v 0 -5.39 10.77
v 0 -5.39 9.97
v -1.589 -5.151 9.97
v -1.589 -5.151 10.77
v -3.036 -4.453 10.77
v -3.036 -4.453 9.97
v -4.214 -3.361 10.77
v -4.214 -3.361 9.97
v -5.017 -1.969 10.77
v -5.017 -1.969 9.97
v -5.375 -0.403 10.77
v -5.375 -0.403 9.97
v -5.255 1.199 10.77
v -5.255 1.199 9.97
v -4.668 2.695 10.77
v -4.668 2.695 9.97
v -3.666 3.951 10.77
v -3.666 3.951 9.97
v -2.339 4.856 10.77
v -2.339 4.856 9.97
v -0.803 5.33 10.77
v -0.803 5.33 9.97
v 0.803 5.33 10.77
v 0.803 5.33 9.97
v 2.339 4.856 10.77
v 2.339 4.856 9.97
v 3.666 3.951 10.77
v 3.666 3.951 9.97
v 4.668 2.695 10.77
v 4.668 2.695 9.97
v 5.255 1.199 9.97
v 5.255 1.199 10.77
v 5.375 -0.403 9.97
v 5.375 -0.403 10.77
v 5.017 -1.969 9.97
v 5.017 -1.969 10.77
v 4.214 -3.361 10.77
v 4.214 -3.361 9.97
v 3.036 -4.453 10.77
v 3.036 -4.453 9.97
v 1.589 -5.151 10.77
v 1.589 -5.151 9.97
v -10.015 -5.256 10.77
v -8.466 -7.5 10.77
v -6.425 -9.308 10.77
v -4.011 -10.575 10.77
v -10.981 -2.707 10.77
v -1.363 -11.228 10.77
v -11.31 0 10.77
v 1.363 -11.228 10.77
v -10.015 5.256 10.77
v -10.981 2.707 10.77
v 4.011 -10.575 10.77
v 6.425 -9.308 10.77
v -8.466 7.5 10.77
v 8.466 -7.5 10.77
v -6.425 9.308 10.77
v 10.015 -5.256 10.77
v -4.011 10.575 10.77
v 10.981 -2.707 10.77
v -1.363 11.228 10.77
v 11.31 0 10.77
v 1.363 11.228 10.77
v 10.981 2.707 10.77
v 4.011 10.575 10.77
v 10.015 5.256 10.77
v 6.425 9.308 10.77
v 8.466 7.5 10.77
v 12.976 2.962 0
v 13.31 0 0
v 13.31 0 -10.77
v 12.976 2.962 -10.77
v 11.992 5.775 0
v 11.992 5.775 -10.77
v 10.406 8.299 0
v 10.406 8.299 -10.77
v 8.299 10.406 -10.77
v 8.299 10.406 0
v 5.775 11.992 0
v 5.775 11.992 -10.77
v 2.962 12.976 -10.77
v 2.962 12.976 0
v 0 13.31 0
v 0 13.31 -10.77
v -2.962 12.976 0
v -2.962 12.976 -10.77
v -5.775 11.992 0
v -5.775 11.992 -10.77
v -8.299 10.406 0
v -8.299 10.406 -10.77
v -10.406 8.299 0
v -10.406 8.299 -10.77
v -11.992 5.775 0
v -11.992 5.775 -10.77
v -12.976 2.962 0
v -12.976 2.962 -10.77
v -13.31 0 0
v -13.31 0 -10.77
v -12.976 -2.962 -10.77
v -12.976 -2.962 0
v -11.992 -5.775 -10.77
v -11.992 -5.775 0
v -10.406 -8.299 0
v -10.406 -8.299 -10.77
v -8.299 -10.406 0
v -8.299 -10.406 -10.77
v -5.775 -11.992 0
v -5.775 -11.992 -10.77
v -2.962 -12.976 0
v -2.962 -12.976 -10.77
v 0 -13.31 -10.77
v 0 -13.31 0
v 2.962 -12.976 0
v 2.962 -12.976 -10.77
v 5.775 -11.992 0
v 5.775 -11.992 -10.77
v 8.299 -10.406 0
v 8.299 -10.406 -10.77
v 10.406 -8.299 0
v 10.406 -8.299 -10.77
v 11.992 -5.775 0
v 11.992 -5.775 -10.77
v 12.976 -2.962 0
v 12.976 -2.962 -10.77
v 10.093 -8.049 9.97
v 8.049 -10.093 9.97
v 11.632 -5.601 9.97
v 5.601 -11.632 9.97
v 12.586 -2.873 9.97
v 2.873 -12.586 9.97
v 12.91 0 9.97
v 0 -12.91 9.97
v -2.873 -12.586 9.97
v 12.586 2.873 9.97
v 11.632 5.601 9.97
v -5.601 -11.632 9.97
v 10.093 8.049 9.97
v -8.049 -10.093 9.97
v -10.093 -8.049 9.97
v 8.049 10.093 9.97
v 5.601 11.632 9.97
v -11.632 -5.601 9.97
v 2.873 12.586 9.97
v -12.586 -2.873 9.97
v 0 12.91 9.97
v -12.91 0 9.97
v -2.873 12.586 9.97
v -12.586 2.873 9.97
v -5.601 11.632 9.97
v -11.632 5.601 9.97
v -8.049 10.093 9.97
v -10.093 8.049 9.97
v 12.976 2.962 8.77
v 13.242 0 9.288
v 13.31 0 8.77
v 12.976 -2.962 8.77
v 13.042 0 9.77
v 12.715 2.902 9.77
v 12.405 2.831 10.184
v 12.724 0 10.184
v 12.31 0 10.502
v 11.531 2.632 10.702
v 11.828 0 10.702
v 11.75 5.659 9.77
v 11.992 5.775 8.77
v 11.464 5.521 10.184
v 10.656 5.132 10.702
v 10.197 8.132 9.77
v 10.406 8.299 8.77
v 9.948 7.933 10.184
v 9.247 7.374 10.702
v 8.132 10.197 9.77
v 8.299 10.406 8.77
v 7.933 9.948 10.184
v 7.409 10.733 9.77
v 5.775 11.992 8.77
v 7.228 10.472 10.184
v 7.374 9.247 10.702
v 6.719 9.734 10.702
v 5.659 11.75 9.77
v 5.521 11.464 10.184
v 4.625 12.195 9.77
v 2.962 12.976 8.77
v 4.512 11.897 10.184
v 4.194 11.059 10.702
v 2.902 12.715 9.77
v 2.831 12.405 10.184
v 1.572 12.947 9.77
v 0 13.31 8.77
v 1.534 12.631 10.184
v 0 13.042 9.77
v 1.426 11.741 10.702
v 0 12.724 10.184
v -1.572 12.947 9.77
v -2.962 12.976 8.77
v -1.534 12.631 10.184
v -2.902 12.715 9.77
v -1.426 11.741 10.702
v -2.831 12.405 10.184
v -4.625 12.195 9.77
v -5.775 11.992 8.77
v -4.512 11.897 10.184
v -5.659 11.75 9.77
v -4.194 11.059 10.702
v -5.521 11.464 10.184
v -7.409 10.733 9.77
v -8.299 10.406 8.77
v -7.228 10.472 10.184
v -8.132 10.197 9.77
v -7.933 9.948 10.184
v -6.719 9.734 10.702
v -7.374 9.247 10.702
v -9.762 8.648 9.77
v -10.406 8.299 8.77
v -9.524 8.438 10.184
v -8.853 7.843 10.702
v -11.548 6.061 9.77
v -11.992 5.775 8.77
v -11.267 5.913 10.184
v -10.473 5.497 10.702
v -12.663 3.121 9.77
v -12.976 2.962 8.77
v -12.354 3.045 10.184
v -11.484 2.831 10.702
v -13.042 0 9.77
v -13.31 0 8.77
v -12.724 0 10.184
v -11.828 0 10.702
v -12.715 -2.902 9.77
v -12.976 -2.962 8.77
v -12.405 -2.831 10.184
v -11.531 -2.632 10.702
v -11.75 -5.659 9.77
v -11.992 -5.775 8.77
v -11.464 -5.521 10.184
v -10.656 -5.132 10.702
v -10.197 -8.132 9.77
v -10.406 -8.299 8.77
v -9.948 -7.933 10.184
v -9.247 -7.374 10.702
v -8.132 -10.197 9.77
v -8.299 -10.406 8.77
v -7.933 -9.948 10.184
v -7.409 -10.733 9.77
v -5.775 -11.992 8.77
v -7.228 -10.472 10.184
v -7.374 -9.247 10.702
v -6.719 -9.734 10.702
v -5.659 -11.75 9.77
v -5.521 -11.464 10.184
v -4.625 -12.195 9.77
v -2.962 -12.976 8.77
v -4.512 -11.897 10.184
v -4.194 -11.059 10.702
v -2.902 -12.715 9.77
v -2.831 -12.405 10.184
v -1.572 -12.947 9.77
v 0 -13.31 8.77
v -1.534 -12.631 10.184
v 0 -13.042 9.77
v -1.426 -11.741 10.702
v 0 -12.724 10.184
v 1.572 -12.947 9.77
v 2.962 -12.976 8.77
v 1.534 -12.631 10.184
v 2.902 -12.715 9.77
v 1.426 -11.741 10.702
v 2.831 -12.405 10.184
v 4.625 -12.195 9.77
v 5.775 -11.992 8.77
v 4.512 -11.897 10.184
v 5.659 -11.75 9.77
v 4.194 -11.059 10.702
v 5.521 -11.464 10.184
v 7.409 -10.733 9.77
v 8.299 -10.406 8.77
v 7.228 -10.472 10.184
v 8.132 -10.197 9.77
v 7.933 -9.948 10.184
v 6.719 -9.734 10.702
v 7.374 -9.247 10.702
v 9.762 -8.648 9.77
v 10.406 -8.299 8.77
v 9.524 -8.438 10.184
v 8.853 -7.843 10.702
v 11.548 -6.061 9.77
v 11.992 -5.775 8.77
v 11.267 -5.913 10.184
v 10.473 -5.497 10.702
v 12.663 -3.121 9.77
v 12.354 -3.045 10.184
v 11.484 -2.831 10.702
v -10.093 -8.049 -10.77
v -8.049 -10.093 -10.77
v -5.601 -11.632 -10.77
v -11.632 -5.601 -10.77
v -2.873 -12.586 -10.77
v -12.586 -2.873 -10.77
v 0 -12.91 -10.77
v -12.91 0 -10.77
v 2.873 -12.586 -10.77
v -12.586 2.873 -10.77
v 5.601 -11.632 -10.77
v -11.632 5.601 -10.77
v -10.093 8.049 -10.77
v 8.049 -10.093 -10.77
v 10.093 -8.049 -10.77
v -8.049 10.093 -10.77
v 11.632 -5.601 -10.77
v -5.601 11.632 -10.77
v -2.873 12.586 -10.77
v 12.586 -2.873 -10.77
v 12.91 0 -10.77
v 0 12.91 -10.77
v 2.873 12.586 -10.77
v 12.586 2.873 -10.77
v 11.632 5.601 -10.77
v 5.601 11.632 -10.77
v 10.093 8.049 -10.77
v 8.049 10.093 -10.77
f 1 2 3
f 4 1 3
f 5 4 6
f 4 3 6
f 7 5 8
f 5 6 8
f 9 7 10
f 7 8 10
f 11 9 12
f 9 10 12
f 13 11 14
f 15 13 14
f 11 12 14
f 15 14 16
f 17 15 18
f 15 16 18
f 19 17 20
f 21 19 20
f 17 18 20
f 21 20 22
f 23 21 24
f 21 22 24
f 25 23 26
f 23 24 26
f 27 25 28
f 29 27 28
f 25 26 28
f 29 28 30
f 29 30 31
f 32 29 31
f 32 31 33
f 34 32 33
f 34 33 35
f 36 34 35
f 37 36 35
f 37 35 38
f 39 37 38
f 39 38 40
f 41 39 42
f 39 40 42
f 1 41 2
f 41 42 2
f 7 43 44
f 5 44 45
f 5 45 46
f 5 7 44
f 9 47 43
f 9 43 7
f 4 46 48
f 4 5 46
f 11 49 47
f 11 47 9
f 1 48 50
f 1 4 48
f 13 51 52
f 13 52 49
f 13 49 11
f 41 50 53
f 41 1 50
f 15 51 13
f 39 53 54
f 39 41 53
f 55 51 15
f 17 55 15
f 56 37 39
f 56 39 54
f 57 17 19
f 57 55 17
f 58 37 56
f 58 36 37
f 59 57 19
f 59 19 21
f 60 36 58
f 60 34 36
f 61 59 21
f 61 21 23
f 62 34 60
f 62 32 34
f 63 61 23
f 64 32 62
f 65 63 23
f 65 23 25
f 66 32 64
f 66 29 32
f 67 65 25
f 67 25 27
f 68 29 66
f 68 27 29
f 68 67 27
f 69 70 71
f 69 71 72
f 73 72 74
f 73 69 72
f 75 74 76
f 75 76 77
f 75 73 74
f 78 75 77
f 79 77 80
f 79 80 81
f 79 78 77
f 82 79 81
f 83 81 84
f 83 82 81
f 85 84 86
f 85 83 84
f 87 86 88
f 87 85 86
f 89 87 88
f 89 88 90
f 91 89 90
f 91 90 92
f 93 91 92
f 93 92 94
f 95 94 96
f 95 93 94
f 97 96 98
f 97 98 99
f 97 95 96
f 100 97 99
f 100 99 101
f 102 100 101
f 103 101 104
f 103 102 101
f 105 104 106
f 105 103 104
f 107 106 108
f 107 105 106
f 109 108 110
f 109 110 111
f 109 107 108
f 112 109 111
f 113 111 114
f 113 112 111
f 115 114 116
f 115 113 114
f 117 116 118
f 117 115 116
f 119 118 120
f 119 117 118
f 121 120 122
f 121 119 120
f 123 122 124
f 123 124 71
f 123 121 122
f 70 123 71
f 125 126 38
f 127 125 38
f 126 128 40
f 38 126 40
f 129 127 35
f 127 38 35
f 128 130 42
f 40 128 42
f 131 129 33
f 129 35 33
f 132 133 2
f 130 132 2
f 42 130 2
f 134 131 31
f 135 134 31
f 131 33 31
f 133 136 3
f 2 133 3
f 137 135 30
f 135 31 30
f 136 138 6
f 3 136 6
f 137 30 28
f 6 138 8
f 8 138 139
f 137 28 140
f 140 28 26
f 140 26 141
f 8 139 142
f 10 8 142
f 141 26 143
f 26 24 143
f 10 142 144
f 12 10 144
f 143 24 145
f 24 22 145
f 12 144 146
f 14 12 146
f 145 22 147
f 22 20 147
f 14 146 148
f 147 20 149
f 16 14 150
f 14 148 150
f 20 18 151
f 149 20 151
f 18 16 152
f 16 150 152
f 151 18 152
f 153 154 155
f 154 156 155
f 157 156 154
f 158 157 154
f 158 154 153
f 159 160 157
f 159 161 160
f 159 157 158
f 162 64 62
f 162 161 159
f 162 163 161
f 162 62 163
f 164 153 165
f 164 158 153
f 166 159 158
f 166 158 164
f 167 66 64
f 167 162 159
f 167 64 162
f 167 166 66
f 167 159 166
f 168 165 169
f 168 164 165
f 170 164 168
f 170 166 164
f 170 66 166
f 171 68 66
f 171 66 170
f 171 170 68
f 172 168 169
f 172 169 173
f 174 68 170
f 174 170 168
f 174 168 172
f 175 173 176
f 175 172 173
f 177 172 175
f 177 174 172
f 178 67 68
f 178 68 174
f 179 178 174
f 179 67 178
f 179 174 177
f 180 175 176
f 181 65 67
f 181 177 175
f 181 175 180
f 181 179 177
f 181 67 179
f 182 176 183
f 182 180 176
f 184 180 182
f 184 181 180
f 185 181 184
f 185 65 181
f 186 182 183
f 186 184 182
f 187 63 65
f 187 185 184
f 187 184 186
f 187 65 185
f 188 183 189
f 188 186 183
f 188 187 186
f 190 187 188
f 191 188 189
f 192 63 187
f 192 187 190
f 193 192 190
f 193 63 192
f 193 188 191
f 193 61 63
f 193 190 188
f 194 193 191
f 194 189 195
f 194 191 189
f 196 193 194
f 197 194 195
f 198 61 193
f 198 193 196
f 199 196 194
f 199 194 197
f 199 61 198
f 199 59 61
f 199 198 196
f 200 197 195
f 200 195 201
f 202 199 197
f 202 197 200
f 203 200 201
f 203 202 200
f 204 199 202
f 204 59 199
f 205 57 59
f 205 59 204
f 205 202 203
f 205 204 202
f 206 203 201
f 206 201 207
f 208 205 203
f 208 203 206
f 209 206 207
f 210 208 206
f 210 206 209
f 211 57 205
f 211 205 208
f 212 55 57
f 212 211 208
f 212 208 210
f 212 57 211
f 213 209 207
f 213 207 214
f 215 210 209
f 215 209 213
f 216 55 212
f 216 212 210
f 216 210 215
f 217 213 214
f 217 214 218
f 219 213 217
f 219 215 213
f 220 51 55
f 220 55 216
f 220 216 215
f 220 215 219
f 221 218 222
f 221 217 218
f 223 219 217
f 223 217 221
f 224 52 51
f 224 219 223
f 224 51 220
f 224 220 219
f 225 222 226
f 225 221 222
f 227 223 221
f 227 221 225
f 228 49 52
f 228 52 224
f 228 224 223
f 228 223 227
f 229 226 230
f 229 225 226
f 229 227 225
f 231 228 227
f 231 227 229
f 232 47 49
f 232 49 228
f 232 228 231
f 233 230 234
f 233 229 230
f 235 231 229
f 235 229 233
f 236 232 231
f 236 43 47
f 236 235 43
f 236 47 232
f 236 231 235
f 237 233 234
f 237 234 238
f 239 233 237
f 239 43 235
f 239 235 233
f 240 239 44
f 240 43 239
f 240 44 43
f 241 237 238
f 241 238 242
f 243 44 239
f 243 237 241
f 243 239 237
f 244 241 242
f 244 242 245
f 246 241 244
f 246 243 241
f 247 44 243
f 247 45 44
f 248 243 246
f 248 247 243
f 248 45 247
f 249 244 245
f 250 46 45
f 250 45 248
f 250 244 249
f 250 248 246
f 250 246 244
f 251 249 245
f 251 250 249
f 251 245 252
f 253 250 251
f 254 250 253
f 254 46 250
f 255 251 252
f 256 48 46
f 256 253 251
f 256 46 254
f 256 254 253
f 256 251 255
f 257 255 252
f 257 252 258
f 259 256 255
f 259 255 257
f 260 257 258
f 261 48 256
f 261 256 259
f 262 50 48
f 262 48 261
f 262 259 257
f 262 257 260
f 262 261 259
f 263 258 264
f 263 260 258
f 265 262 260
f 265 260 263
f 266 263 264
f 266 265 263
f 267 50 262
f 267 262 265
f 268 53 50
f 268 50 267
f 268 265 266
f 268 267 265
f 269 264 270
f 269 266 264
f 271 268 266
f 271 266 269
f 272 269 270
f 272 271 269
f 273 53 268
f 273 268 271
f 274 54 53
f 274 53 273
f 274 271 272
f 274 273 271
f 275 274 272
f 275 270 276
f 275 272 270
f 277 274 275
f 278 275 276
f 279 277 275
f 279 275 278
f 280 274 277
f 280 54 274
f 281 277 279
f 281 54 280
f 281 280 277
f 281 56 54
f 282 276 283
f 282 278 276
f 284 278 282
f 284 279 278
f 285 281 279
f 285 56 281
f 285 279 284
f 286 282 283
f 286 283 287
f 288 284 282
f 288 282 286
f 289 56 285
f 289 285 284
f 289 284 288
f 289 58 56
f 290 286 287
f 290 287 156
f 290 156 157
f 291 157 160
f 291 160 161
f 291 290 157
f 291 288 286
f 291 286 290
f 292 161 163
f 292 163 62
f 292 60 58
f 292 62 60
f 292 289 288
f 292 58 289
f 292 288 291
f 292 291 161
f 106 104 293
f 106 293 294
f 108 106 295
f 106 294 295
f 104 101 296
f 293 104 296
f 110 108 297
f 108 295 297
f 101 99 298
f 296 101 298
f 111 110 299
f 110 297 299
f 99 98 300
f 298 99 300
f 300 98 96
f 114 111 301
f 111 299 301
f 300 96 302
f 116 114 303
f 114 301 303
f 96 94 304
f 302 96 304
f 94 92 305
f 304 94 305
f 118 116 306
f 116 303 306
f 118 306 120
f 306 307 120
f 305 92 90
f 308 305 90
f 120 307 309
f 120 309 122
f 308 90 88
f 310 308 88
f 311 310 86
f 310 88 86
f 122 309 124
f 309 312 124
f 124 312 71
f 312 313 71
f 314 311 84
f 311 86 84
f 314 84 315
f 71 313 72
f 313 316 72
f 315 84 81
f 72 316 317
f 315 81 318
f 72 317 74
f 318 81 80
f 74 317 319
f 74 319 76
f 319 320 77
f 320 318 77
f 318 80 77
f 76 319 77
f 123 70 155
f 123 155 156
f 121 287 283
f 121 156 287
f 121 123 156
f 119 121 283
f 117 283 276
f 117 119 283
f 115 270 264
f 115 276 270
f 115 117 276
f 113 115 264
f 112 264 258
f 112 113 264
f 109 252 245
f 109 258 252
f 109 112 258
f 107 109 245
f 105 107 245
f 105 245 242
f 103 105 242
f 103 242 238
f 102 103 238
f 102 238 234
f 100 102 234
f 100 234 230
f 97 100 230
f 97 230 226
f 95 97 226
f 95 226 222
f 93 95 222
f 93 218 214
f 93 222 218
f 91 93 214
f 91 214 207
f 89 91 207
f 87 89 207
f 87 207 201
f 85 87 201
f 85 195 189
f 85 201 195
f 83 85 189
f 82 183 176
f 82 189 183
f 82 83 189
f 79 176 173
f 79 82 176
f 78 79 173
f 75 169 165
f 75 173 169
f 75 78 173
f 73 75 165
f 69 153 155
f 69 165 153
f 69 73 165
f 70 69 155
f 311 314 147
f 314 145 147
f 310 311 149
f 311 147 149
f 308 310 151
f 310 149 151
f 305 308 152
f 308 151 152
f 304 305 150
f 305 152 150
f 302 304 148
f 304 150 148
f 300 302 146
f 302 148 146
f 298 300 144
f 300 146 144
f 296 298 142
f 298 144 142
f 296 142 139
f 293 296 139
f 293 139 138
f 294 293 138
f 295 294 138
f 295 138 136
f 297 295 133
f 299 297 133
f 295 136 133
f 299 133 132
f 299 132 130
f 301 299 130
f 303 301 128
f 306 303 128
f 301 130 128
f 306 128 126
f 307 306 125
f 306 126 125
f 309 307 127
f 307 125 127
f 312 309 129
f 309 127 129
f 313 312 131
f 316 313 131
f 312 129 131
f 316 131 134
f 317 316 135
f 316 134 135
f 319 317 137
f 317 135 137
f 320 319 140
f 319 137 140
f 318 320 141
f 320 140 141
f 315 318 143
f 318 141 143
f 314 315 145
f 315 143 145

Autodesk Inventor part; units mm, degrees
ref_plane "YZ Plane" through (0, 0, 0) normal (1, 0, 0) x (0, 1, 0)
ref_plane "XZ Plane" through (0, 0, 0) normal (0, 1, 0) x (-1, 0, 0)
ref_plane "XY Plane" through (0, 0, 0) normal (0, 0, 1) x (1, 0, 0)
sketch "Boceto1" plane through (0, 0, 0) normal (0, 0, 1) x (1, 0, 0)
  circle A0 centre (0, 0) radius 13.31
  dimension "d0" = 26.62
extrude "Extrusión1" add sketch "Boceto1" along normal mid plane 21.54
sketch "Boceto2" plane through (0, 0, 0) normal (0, 1, 0) x (-1, 0, 0)
  point P0 (0, 0)
hole "Hole1" at (0, 0, 10.77) direction (0, 0, -1) diameter 10.78 depth 0.8
hole "Hole2" at (0, 0, -10.77) direction (0, 0, 1) diameter 25.82 depth 20.74
fillet "Empalme1" radius 2 1 edges at (-13.31, 0, 10.77)
properties part number "CajaMotor"
